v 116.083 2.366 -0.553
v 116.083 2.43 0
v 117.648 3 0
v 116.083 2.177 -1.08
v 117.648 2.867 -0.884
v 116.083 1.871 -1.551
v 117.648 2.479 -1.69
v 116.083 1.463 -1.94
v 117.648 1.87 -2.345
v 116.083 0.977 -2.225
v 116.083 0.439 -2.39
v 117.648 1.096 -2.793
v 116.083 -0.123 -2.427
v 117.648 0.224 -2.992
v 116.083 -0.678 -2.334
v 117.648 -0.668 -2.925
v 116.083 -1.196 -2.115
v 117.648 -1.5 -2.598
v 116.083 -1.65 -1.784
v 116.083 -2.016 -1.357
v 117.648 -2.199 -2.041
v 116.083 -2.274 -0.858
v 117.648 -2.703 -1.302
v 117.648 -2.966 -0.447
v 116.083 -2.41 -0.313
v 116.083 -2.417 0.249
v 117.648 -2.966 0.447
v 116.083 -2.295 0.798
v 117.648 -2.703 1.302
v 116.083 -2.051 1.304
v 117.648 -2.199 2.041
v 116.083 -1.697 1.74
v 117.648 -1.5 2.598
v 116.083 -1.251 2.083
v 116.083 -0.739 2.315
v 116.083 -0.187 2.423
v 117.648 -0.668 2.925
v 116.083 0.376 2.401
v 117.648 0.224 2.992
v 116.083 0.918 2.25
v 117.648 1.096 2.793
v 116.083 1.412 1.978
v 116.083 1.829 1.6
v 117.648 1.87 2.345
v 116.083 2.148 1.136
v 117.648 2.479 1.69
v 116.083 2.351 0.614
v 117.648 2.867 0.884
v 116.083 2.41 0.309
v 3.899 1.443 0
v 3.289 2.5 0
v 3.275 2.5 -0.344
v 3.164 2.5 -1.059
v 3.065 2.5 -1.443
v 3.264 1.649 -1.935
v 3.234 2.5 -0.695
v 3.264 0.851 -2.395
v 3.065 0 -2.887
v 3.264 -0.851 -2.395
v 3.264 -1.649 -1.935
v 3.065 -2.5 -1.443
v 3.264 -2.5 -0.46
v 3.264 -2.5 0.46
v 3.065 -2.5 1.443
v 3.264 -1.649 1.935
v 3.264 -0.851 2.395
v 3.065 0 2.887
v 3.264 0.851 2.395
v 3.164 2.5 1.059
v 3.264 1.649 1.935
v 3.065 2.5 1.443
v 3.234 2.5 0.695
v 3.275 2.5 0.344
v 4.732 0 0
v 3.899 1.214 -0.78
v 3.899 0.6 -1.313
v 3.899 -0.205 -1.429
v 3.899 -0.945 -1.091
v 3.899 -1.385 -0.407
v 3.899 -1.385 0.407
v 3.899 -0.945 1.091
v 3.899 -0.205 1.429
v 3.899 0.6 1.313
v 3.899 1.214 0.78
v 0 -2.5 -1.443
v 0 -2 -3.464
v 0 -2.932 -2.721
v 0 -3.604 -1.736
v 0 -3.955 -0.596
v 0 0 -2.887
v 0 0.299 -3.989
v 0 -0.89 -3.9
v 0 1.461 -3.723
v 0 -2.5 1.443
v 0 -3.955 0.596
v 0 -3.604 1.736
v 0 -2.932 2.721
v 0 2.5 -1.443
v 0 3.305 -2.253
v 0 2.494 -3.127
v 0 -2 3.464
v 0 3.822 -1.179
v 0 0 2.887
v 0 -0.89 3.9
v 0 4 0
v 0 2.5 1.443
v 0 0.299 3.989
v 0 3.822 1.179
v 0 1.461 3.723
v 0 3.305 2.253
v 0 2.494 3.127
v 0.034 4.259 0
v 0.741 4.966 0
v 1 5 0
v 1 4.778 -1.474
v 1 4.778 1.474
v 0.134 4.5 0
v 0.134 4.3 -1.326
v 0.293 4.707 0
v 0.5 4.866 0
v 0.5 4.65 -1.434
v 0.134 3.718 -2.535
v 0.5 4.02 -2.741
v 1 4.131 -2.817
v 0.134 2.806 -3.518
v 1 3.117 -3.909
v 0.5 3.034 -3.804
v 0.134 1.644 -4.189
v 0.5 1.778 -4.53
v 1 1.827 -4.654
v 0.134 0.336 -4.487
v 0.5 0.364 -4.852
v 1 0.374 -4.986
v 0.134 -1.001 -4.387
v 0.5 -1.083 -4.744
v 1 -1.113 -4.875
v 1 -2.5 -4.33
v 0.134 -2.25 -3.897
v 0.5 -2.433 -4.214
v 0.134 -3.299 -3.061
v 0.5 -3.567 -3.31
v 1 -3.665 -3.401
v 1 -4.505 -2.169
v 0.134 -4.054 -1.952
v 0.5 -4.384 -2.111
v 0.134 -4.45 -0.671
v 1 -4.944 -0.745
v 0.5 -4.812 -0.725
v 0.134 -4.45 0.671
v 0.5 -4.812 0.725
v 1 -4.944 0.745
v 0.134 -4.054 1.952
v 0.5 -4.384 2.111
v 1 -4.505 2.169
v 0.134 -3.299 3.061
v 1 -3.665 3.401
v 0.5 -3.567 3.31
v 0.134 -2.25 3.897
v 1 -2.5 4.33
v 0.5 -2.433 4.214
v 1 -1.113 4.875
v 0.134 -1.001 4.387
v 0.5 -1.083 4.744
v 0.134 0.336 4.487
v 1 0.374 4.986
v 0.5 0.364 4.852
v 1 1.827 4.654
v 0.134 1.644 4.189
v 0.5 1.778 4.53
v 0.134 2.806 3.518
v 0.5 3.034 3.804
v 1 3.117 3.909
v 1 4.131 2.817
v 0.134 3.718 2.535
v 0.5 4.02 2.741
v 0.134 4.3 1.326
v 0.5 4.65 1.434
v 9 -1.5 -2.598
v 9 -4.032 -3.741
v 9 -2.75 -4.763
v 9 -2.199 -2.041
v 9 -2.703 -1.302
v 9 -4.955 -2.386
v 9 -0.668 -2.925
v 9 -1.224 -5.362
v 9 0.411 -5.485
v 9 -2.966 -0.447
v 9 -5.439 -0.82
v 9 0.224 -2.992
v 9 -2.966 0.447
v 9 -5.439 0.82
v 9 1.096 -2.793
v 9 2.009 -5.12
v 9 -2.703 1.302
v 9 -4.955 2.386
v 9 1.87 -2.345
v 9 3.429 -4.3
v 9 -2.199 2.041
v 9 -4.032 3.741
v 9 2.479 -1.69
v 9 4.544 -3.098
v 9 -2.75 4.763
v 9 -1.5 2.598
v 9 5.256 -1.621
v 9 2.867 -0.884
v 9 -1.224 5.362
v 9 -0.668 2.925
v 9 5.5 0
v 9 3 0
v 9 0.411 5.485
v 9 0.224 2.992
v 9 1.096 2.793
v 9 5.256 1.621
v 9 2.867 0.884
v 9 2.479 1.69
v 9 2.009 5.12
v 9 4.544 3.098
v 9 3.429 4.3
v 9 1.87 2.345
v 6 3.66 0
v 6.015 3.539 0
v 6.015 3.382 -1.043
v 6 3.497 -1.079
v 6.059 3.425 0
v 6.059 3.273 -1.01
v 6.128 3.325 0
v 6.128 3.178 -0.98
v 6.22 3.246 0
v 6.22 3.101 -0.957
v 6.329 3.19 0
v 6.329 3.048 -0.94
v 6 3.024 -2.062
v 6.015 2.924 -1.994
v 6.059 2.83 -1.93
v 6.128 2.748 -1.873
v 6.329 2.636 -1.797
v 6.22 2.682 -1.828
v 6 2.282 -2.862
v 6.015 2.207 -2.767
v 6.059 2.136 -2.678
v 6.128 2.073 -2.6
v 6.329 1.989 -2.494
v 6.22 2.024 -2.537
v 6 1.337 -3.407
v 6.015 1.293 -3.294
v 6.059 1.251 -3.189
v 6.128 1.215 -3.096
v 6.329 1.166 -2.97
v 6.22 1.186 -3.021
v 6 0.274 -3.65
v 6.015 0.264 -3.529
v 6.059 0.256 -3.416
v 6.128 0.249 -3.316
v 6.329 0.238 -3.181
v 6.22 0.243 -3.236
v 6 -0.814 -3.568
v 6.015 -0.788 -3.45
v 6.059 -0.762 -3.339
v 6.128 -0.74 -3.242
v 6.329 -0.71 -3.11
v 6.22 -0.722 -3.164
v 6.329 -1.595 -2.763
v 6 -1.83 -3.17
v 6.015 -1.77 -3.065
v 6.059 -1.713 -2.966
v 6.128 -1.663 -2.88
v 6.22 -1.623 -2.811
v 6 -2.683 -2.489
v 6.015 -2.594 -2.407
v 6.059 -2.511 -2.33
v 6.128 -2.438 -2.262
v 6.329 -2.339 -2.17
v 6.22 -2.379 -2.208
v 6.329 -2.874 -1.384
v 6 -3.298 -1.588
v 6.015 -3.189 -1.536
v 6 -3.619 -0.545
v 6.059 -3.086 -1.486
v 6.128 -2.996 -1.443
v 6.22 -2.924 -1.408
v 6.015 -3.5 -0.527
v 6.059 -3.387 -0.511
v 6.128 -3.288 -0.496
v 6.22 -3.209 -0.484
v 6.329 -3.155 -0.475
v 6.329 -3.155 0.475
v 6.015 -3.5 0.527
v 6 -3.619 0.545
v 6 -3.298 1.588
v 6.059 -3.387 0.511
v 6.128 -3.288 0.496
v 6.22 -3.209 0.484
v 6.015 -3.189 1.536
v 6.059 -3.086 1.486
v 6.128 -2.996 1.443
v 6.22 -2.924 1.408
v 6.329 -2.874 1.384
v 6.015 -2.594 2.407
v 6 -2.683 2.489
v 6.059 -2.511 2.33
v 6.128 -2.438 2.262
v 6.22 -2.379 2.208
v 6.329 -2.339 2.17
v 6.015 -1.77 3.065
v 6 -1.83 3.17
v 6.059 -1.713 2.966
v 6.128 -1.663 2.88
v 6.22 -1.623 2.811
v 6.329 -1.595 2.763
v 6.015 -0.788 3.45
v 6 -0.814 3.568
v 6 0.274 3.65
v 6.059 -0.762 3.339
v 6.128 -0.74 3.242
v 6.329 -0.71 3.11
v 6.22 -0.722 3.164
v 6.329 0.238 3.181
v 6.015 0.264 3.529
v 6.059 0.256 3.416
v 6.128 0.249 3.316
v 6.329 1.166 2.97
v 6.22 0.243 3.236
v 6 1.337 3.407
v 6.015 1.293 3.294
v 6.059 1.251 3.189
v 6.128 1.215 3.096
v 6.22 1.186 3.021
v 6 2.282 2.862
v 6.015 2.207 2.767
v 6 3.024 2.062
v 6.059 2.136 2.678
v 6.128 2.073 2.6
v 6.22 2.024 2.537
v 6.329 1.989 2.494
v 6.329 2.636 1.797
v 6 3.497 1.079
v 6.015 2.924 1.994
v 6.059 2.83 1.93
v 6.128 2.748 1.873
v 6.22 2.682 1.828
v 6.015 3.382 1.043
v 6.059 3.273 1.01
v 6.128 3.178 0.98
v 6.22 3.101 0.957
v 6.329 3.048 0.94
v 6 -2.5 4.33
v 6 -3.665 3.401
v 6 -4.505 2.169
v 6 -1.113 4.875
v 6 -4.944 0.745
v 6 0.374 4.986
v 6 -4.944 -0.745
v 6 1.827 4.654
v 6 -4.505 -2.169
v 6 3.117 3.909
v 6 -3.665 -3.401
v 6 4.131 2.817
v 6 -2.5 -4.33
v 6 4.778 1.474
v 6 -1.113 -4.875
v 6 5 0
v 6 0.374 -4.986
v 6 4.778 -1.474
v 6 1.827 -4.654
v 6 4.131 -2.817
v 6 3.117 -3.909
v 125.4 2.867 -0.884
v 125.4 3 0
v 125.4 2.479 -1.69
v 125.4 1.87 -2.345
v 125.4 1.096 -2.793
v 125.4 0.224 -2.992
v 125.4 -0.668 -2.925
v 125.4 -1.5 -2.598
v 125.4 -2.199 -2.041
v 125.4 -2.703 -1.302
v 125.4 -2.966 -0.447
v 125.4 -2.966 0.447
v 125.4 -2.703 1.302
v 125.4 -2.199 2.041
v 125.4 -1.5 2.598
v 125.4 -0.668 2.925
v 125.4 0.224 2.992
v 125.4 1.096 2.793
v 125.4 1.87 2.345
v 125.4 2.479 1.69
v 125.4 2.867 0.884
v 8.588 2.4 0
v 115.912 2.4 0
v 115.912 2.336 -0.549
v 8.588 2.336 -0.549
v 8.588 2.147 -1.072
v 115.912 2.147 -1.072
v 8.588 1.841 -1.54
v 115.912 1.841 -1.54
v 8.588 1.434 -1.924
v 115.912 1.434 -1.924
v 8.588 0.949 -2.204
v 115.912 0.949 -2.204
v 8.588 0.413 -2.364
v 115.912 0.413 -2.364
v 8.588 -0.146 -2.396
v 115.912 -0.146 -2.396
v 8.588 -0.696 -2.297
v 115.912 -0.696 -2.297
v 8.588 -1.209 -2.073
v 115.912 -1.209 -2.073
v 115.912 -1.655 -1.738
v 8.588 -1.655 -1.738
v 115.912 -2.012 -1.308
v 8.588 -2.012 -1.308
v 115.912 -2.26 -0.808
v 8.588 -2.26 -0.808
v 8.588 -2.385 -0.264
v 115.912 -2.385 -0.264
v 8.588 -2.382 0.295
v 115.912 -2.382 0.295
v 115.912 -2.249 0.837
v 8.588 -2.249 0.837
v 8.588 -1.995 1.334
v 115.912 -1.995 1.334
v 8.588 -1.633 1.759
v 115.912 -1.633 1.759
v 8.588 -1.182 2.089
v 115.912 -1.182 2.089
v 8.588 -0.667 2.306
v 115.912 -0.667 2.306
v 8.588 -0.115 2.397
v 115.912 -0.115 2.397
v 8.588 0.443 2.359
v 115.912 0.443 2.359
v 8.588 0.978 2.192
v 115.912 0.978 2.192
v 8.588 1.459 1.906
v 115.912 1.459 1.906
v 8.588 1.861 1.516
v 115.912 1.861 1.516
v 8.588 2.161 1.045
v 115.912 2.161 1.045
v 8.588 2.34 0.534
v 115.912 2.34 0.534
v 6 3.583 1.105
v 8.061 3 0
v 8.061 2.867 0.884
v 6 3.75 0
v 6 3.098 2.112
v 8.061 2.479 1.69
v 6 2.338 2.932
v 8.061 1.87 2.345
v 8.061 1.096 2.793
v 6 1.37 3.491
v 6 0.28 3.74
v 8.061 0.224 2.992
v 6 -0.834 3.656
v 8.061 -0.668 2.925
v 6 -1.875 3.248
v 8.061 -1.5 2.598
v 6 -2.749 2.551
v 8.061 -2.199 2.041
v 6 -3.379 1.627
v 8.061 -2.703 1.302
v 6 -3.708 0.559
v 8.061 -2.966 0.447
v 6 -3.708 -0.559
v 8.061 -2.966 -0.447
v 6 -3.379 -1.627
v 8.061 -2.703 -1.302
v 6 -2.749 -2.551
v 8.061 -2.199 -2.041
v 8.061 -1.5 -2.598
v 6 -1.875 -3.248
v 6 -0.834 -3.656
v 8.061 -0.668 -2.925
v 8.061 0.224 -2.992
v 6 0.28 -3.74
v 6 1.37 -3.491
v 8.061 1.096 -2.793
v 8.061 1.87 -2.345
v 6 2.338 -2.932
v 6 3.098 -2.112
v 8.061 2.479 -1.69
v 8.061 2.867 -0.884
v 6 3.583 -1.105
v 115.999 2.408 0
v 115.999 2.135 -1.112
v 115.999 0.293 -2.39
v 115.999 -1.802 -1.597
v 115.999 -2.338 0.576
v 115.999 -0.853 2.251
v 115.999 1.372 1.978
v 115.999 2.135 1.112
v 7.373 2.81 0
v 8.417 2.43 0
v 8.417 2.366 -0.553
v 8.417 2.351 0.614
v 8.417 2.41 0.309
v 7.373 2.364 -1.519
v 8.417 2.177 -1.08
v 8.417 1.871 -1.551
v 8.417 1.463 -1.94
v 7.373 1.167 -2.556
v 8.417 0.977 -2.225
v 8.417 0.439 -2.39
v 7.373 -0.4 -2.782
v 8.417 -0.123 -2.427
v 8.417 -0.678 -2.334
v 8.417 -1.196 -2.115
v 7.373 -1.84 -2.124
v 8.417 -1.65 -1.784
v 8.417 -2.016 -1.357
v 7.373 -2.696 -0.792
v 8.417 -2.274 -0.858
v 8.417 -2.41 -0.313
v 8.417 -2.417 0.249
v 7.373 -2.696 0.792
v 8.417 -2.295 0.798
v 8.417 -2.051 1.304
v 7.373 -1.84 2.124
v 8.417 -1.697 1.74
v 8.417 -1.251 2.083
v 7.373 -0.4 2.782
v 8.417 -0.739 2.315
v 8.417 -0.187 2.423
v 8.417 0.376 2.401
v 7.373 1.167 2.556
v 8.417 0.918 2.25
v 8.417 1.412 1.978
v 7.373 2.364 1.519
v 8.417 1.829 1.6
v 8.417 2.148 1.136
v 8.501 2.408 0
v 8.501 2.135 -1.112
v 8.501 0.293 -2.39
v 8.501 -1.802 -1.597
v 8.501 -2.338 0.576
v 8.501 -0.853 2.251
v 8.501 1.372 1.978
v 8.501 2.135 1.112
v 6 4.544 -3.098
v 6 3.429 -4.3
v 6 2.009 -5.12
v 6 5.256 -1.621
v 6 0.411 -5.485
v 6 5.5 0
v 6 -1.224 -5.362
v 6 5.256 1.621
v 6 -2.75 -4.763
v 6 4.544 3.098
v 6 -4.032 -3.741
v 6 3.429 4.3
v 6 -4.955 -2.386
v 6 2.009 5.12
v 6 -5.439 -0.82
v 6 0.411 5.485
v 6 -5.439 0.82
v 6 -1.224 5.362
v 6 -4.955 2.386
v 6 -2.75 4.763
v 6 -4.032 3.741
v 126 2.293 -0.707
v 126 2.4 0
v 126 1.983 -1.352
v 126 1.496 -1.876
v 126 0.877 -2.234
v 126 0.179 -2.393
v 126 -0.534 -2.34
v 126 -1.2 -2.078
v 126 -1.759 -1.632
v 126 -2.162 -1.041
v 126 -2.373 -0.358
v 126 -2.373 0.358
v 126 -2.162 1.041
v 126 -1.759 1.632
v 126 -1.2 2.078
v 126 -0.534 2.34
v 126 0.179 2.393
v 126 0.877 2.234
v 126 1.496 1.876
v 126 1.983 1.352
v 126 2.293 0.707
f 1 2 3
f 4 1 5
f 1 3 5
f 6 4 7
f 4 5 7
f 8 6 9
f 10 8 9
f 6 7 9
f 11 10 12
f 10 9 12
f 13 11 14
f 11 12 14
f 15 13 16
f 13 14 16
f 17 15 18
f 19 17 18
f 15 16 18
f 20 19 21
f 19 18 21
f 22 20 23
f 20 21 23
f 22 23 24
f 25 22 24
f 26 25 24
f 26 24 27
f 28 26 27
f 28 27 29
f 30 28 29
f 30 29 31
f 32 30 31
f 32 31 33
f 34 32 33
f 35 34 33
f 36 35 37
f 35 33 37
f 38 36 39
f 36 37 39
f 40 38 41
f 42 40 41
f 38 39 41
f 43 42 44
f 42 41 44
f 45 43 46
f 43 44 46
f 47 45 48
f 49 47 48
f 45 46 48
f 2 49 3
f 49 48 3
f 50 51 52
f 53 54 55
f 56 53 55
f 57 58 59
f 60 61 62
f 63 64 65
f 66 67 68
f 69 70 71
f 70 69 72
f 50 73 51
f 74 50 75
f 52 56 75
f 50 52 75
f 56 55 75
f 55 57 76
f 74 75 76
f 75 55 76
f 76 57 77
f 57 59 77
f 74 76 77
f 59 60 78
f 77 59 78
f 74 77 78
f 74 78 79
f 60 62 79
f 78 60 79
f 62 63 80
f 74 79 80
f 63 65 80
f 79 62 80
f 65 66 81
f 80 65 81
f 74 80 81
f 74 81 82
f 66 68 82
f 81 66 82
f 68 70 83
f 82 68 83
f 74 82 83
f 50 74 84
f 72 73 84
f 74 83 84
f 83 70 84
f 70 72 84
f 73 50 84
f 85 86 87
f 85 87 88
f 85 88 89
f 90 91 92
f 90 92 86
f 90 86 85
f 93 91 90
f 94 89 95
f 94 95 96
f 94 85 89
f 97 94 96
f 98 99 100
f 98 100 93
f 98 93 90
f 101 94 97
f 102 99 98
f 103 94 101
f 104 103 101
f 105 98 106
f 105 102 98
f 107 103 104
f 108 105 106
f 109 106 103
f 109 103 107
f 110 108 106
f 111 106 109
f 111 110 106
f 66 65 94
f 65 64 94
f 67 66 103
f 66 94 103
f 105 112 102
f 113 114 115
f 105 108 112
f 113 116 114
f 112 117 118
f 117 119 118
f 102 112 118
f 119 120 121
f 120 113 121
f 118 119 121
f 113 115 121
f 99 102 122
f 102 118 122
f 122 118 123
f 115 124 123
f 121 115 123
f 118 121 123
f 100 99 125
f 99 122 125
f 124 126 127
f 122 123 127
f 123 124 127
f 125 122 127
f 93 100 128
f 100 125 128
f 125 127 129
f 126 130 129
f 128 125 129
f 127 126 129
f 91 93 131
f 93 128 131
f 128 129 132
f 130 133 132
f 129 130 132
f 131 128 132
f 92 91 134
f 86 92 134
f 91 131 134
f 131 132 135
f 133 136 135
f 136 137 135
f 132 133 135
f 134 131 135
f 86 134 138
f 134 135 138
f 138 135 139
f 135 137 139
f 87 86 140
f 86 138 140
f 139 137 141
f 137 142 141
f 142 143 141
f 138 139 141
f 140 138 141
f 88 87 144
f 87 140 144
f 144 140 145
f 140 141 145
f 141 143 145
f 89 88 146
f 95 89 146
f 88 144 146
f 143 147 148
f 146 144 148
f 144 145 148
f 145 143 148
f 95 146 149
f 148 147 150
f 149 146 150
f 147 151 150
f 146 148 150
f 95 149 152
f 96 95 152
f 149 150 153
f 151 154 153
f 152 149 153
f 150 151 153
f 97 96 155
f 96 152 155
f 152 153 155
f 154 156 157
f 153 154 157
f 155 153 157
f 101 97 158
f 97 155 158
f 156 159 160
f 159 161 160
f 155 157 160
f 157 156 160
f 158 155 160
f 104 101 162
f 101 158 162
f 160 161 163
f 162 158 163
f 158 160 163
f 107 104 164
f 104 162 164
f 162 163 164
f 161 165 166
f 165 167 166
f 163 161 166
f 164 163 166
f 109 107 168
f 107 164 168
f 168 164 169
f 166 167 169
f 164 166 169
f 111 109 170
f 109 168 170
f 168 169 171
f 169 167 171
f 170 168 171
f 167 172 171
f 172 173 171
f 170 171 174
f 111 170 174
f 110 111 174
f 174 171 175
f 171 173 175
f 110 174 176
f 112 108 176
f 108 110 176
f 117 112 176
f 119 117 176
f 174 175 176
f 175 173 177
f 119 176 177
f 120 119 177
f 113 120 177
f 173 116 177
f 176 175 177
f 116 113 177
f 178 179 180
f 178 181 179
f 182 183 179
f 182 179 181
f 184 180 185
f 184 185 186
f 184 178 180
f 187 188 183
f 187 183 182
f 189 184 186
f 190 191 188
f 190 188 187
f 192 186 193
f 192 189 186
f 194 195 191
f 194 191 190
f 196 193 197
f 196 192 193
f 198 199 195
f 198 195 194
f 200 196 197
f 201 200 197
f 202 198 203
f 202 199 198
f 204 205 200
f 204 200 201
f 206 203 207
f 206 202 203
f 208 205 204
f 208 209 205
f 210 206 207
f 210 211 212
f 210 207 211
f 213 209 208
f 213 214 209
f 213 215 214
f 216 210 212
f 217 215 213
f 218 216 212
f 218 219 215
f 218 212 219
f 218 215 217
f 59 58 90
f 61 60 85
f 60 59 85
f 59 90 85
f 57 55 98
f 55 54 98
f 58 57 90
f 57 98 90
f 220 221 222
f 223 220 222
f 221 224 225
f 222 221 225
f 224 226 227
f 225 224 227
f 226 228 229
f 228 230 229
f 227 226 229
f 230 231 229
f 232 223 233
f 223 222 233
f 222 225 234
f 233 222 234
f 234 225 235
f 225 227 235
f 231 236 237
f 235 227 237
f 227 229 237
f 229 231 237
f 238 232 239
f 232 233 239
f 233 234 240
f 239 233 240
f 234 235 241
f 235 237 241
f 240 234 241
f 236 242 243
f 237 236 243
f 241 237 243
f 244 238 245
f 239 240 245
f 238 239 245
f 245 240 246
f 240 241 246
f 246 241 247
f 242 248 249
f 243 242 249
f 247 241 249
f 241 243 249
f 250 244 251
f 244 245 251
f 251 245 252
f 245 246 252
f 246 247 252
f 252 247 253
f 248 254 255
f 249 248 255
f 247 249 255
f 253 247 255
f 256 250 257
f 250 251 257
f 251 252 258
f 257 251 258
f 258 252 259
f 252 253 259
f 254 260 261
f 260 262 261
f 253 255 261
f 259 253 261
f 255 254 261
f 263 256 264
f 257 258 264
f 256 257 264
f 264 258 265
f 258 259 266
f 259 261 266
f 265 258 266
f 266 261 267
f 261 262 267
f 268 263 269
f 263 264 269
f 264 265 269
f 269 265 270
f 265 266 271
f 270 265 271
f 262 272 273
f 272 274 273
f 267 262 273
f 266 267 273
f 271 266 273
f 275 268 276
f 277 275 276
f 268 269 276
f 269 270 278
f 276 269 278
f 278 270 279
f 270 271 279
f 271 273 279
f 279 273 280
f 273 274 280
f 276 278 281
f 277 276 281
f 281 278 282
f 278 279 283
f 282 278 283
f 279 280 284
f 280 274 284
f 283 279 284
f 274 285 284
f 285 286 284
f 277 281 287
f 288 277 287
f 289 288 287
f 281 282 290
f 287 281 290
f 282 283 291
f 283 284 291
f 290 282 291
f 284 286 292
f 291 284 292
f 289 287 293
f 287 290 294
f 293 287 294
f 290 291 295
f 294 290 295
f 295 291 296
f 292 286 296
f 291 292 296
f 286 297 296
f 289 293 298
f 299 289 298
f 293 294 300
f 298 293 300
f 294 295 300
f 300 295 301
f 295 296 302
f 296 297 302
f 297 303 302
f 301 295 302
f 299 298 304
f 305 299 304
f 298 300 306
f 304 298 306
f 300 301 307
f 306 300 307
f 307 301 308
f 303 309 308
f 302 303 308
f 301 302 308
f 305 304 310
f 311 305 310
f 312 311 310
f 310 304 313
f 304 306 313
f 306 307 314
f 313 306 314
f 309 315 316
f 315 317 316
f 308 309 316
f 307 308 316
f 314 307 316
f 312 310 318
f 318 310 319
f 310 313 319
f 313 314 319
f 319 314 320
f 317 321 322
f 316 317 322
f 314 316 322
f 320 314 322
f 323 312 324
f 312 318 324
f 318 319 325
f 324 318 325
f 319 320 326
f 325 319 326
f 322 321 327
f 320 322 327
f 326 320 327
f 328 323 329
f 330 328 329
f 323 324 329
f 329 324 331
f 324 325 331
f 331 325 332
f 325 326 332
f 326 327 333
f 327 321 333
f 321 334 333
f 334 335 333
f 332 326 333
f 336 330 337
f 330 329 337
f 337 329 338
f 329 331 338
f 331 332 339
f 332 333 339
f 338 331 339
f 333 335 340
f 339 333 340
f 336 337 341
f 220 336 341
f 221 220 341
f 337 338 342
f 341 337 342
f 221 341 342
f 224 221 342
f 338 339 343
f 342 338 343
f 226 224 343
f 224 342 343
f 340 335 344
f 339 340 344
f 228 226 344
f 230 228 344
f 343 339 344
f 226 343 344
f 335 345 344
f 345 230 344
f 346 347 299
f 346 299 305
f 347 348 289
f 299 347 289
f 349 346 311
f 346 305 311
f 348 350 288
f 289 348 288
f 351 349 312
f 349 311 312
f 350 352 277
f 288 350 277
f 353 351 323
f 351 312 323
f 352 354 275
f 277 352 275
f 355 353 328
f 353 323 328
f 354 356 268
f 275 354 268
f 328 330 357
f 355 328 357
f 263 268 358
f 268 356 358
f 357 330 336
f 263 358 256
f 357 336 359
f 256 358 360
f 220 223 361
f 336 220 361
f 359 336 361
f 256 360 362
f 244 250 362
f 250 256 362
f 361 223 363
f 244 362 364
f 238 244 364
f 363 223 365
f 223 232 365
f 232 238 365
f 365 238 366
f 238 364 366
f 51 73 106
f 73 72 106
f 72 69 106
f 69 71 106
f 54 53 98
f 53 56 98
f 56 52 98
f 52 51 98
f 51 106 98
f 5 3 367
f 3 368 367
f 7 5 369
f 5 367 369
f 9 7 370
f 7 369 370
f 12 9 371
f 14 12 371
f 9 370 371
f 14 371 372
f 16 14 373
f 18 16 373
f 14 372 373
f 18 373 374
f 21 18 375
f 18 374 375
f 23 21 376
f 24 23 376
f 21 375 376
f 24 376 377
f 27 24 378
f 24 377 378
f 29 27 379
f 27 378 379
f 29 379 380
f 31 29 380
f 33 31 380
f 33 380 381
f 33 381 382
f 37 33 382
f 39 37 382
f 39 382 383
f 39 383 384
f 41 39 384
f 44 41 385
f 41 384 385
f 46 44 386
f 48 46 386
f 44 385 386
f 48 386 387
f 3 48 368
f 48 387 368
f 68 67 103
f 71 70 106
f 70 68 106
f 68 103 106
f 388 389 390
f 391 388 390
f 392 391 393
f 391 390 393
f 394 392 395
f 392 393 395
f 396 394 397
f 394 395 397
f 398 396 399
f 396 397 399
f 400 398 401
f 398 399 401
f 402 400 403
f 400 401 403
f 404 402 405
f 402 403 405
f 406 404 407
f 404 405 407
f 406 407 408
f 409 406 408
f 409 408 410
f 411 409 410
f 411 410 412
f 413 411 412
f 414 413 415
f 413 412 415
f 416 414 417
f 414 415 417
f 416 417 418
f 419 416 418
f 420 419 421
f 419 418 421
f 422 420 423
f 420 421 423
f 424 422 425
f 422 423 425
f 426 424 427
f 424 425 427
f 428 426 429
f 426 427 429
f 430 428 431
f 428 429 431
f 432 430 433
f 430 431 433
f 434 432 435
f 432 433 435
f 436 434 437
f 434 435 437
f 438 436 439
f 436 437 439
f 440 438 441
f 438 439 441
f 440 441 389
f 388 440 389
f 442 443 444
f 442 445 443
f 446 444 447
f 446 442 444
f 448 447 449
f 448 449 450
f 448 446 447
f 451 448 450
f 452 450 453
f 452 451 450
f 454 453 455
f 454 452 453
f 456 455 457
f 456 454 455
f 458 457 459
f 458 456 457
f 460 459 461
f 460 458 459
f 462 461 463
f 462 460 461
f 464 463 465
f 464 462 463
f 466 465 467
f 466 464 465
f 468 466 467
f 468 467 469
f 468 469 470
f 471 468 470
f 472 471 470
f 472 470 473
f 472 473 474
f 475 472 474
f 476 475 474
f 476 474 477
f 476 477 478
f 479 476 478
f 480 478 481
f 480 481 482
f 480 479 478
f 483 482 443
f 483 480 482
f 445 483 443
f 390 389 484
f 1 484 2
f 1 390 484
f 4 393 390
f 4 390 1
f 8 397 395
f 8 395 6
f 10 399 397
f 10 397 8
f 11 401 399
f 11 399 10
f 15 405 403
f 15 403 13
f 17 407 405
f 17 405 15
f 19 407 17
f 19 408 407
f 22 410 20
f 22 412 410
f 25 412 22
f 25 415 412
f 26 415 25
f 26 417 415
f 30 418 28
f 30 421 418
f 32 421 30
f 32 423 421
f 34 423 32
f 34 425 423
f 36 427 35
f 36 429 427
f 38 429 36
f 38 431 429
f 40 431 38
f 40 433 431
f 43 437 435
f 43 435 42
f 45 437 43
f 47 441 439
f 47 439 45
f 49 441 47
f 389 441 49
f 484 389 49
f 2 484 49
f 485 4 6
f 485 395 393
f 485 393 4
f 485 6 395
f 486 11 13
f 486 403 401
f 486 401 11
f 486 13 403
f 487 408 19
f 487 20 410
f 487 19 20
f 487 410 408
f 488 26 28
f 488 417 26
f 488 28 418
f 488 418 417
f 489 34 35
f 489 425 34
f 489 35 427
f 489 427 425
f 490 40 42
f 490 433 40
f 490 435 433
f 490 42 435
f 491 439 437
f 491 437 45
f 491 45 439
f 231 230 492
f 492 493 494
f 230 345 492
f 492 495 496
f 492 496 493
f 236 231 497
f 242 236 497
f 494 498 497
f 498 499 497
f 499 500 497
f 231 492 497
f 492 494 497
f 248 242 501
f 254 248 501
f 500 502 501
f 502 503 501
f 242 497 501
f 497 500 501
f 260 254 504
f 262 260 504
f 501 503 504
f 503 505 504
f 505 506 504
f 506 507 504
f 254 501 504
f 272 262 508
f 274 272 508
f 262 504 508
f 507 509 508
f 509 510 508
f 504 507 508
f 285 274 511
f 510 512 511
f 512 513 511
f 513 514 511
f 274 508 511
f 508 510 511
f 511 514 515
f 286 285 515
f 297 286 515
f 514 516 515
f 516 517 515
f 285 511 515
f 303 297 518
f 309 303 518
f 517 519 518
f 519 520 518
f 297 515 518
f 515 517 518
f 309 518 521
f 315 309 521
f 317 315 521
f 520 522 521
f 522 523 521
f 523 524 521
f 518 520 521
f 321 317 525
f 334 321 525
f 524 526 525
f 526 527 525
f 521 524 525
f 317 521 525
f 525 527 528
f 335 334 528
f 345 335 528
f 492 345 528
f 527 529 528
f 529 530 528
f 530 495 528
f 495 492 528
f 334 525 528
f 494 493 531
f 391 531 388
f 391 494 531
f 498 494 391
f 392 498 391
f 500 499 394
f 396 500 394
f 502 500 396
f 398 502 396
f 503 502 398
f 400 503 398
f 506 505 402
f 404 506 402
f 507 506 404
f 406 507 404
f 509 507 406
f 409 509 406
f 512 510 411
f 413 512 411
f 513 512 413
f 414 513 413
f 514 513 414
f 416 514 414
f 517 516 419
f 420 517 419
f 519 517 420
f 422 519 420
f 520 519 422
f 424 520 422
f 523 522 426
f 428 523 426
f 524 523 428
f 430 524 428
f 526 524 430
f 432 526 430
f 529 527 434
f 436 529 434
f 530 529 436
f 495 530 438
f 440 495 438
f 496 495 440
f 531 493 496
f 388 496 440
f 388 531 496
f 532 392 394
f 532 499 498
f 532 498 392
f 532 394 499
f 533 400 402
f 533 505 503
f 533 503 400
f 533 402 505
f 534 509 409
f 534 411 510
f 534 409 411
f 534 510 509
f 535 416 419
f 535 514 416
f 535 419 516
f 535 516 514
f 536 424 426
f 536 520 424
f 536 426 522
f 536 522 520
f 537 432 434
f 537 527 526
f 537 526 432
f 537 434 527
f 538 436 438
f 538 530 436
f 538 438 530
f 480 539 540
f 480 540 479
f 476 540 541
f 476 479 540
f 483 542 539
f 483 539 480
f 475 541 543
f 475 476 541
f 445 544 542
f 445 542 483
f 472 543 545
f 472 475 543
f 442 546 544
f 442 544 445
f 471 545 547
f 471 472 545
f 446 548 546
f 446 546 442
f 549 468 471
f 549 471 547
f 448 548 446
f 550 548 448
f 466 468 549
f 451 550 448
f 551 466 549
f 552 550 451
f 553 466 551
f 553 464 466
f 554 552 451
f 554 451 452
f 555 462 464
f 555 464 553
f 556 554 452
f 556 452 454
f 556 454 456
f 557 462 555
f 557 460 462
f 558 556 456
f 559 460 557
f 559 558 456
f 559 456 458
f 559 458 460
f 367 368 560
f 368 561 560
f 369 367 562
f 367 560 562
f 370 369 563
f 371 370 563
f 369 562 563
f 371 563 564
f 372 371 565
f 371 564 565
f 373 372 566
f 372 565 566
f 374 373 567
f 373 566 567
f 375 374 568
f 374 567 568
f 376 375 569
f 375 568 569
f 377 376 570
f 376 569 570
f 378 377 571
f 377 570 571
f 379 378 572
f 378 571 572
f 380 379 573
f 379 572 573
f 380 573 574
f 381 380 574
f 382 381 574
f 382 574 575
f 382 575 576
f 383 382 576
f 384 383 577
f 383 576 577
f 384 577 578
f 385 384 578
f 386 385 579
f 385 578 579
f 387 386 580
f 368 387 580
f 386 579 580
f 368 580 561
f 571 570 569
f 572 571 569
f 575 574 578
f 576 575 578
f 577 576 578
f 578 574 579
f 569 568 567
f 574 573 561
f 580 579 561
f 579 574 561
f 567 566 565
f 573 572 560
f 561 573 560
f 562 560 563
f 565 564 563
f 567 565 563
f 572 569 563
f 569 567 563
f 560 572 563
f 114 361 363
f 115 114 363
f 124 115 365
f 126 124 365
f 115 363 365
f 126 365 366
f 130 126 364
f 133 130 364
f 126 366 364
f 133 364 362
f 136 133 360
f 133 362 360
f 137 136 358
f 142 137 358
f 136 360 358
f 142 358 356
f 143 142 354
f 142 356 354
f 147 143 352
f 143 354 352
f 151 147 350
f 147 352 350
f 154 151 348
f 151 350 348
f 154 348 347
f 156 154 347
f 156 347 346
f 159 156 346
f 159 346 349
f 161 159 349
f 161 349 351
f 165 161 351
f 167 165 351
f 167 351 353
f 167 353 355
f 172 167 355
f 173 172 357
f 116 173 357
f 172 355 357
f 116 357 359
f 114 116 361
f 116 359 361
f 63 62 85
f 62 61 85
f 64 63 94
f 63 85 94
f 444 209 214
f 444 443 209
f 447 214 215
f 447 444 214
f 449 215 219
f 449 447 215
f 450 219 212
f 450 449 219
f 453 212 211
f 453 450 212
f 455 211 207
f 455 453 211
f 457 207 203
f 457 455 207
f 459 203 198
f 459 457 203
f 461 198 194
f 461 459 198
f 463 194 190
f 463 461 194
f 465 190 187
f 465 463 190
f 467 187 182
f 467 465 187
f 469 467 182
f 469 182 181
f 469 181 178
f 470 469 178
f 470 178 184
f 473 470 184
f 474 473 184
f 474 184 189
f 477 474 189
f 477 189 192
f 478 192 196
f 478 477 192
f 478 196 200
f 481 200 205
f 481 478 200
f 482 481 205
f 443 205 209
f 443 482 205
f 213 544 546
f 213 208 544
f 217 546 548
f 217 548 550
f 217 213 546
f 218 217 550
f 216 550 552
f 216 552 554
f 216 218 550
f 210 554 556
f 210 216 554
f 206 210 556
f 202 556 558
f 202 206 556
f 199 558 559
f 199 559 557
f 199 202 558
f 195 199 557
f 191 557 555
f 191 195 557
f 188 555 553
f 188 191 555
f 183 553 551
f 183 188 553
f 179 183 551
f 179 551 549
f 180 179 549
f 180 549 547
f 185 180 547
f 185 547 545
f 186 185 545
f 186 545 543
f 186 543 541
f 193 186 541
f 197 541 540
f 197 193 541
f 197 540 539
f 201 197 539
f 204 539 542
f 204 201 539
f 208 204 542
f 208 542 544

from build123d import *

# Parameters (mm, degrees)
AUFSATZ_LINEAR_AUSTRAGEN1_REACH = 128
SKIZZE2_R                       = 3
VERRUNDUNG1_R                   = 1
VERRUNDUNG2_R                   = 0.5


with BuildPart() as part:
    # Skizze1 → Rotation1 (revolve)
    with BuildSketch(Plane.XY):
        Polygon((0, 5), (6, 5), (6, 3.309925586), (8.5, 2.4), (116, 2.4), (117.648486452, 3), (125.4, 3), (126, 2.4), (126, 0), (4.732050808, 0), (3, 3), (0, 3), align=None)
    revolve(axis=Axis((0, 0, 0), (-1, 0, 0)))

    # Skizze2 → Aufsatz-Linear austragen1 (add, up to next)
    with BuildSketch(Plane.ZY, mode=Mode.PRIVATE) as aufsatz_linear_austragen1_sk1:
        Circle(SKIZZE2_R)
        Polygon((-2.886751346, 0), (-1.443375673, -2.5), (1.443375673, -2.5), (2.886751346, 0), (1.443375673, 2.5), (-1.443375673, 2.5), align=None, mode=Mode.SUBTRACT)
    aufsatz_linear_austragen1_tool1 = extrude(aufsatz_linear_austragen1_sk1.sketch, amount=-AUFSATZ_LINEAR_AUSTRAGEN1_REACH, mode=Mode.PRIVATE) - part.part
    add(aufsatz_linear_austragen1_tool1.solids().sort_by_distance((0, 0, -2.915147))[0])

    # Verrundung1
    verrundung1_edges = [part.edges().sort_by_distance(p)[0] for p in [
        (0, -5, 0),
    ]]
    fillet(verrundung1_edges, radius=VERRUNDUNG1_R)

    # Verrundung2
    verrundung2_edges = [part.edges().sort_by_distance(p)[0] for p in [
        (116, -2.4, 0),
        (8.5, -2.4, 0),
        (6, -3.309925586, 0),
    ]]
    fillet(verrundung2_edges, radius=VERRUNDUNG2_R)


with BuildPart() as body_2:
    # Skizze3 → Rotation2 (revolve)
    with BuildSketch(Plane.XY):
        Polygon((6, 5.5), (9, 5.5), (9, 3), (8.060608065, 3), (6, 3.75), align=None)
    revolve(axis=Axis((0, 0, 0), (1, 0, 0)))


solid = Compound([part.part, body_2.part])
